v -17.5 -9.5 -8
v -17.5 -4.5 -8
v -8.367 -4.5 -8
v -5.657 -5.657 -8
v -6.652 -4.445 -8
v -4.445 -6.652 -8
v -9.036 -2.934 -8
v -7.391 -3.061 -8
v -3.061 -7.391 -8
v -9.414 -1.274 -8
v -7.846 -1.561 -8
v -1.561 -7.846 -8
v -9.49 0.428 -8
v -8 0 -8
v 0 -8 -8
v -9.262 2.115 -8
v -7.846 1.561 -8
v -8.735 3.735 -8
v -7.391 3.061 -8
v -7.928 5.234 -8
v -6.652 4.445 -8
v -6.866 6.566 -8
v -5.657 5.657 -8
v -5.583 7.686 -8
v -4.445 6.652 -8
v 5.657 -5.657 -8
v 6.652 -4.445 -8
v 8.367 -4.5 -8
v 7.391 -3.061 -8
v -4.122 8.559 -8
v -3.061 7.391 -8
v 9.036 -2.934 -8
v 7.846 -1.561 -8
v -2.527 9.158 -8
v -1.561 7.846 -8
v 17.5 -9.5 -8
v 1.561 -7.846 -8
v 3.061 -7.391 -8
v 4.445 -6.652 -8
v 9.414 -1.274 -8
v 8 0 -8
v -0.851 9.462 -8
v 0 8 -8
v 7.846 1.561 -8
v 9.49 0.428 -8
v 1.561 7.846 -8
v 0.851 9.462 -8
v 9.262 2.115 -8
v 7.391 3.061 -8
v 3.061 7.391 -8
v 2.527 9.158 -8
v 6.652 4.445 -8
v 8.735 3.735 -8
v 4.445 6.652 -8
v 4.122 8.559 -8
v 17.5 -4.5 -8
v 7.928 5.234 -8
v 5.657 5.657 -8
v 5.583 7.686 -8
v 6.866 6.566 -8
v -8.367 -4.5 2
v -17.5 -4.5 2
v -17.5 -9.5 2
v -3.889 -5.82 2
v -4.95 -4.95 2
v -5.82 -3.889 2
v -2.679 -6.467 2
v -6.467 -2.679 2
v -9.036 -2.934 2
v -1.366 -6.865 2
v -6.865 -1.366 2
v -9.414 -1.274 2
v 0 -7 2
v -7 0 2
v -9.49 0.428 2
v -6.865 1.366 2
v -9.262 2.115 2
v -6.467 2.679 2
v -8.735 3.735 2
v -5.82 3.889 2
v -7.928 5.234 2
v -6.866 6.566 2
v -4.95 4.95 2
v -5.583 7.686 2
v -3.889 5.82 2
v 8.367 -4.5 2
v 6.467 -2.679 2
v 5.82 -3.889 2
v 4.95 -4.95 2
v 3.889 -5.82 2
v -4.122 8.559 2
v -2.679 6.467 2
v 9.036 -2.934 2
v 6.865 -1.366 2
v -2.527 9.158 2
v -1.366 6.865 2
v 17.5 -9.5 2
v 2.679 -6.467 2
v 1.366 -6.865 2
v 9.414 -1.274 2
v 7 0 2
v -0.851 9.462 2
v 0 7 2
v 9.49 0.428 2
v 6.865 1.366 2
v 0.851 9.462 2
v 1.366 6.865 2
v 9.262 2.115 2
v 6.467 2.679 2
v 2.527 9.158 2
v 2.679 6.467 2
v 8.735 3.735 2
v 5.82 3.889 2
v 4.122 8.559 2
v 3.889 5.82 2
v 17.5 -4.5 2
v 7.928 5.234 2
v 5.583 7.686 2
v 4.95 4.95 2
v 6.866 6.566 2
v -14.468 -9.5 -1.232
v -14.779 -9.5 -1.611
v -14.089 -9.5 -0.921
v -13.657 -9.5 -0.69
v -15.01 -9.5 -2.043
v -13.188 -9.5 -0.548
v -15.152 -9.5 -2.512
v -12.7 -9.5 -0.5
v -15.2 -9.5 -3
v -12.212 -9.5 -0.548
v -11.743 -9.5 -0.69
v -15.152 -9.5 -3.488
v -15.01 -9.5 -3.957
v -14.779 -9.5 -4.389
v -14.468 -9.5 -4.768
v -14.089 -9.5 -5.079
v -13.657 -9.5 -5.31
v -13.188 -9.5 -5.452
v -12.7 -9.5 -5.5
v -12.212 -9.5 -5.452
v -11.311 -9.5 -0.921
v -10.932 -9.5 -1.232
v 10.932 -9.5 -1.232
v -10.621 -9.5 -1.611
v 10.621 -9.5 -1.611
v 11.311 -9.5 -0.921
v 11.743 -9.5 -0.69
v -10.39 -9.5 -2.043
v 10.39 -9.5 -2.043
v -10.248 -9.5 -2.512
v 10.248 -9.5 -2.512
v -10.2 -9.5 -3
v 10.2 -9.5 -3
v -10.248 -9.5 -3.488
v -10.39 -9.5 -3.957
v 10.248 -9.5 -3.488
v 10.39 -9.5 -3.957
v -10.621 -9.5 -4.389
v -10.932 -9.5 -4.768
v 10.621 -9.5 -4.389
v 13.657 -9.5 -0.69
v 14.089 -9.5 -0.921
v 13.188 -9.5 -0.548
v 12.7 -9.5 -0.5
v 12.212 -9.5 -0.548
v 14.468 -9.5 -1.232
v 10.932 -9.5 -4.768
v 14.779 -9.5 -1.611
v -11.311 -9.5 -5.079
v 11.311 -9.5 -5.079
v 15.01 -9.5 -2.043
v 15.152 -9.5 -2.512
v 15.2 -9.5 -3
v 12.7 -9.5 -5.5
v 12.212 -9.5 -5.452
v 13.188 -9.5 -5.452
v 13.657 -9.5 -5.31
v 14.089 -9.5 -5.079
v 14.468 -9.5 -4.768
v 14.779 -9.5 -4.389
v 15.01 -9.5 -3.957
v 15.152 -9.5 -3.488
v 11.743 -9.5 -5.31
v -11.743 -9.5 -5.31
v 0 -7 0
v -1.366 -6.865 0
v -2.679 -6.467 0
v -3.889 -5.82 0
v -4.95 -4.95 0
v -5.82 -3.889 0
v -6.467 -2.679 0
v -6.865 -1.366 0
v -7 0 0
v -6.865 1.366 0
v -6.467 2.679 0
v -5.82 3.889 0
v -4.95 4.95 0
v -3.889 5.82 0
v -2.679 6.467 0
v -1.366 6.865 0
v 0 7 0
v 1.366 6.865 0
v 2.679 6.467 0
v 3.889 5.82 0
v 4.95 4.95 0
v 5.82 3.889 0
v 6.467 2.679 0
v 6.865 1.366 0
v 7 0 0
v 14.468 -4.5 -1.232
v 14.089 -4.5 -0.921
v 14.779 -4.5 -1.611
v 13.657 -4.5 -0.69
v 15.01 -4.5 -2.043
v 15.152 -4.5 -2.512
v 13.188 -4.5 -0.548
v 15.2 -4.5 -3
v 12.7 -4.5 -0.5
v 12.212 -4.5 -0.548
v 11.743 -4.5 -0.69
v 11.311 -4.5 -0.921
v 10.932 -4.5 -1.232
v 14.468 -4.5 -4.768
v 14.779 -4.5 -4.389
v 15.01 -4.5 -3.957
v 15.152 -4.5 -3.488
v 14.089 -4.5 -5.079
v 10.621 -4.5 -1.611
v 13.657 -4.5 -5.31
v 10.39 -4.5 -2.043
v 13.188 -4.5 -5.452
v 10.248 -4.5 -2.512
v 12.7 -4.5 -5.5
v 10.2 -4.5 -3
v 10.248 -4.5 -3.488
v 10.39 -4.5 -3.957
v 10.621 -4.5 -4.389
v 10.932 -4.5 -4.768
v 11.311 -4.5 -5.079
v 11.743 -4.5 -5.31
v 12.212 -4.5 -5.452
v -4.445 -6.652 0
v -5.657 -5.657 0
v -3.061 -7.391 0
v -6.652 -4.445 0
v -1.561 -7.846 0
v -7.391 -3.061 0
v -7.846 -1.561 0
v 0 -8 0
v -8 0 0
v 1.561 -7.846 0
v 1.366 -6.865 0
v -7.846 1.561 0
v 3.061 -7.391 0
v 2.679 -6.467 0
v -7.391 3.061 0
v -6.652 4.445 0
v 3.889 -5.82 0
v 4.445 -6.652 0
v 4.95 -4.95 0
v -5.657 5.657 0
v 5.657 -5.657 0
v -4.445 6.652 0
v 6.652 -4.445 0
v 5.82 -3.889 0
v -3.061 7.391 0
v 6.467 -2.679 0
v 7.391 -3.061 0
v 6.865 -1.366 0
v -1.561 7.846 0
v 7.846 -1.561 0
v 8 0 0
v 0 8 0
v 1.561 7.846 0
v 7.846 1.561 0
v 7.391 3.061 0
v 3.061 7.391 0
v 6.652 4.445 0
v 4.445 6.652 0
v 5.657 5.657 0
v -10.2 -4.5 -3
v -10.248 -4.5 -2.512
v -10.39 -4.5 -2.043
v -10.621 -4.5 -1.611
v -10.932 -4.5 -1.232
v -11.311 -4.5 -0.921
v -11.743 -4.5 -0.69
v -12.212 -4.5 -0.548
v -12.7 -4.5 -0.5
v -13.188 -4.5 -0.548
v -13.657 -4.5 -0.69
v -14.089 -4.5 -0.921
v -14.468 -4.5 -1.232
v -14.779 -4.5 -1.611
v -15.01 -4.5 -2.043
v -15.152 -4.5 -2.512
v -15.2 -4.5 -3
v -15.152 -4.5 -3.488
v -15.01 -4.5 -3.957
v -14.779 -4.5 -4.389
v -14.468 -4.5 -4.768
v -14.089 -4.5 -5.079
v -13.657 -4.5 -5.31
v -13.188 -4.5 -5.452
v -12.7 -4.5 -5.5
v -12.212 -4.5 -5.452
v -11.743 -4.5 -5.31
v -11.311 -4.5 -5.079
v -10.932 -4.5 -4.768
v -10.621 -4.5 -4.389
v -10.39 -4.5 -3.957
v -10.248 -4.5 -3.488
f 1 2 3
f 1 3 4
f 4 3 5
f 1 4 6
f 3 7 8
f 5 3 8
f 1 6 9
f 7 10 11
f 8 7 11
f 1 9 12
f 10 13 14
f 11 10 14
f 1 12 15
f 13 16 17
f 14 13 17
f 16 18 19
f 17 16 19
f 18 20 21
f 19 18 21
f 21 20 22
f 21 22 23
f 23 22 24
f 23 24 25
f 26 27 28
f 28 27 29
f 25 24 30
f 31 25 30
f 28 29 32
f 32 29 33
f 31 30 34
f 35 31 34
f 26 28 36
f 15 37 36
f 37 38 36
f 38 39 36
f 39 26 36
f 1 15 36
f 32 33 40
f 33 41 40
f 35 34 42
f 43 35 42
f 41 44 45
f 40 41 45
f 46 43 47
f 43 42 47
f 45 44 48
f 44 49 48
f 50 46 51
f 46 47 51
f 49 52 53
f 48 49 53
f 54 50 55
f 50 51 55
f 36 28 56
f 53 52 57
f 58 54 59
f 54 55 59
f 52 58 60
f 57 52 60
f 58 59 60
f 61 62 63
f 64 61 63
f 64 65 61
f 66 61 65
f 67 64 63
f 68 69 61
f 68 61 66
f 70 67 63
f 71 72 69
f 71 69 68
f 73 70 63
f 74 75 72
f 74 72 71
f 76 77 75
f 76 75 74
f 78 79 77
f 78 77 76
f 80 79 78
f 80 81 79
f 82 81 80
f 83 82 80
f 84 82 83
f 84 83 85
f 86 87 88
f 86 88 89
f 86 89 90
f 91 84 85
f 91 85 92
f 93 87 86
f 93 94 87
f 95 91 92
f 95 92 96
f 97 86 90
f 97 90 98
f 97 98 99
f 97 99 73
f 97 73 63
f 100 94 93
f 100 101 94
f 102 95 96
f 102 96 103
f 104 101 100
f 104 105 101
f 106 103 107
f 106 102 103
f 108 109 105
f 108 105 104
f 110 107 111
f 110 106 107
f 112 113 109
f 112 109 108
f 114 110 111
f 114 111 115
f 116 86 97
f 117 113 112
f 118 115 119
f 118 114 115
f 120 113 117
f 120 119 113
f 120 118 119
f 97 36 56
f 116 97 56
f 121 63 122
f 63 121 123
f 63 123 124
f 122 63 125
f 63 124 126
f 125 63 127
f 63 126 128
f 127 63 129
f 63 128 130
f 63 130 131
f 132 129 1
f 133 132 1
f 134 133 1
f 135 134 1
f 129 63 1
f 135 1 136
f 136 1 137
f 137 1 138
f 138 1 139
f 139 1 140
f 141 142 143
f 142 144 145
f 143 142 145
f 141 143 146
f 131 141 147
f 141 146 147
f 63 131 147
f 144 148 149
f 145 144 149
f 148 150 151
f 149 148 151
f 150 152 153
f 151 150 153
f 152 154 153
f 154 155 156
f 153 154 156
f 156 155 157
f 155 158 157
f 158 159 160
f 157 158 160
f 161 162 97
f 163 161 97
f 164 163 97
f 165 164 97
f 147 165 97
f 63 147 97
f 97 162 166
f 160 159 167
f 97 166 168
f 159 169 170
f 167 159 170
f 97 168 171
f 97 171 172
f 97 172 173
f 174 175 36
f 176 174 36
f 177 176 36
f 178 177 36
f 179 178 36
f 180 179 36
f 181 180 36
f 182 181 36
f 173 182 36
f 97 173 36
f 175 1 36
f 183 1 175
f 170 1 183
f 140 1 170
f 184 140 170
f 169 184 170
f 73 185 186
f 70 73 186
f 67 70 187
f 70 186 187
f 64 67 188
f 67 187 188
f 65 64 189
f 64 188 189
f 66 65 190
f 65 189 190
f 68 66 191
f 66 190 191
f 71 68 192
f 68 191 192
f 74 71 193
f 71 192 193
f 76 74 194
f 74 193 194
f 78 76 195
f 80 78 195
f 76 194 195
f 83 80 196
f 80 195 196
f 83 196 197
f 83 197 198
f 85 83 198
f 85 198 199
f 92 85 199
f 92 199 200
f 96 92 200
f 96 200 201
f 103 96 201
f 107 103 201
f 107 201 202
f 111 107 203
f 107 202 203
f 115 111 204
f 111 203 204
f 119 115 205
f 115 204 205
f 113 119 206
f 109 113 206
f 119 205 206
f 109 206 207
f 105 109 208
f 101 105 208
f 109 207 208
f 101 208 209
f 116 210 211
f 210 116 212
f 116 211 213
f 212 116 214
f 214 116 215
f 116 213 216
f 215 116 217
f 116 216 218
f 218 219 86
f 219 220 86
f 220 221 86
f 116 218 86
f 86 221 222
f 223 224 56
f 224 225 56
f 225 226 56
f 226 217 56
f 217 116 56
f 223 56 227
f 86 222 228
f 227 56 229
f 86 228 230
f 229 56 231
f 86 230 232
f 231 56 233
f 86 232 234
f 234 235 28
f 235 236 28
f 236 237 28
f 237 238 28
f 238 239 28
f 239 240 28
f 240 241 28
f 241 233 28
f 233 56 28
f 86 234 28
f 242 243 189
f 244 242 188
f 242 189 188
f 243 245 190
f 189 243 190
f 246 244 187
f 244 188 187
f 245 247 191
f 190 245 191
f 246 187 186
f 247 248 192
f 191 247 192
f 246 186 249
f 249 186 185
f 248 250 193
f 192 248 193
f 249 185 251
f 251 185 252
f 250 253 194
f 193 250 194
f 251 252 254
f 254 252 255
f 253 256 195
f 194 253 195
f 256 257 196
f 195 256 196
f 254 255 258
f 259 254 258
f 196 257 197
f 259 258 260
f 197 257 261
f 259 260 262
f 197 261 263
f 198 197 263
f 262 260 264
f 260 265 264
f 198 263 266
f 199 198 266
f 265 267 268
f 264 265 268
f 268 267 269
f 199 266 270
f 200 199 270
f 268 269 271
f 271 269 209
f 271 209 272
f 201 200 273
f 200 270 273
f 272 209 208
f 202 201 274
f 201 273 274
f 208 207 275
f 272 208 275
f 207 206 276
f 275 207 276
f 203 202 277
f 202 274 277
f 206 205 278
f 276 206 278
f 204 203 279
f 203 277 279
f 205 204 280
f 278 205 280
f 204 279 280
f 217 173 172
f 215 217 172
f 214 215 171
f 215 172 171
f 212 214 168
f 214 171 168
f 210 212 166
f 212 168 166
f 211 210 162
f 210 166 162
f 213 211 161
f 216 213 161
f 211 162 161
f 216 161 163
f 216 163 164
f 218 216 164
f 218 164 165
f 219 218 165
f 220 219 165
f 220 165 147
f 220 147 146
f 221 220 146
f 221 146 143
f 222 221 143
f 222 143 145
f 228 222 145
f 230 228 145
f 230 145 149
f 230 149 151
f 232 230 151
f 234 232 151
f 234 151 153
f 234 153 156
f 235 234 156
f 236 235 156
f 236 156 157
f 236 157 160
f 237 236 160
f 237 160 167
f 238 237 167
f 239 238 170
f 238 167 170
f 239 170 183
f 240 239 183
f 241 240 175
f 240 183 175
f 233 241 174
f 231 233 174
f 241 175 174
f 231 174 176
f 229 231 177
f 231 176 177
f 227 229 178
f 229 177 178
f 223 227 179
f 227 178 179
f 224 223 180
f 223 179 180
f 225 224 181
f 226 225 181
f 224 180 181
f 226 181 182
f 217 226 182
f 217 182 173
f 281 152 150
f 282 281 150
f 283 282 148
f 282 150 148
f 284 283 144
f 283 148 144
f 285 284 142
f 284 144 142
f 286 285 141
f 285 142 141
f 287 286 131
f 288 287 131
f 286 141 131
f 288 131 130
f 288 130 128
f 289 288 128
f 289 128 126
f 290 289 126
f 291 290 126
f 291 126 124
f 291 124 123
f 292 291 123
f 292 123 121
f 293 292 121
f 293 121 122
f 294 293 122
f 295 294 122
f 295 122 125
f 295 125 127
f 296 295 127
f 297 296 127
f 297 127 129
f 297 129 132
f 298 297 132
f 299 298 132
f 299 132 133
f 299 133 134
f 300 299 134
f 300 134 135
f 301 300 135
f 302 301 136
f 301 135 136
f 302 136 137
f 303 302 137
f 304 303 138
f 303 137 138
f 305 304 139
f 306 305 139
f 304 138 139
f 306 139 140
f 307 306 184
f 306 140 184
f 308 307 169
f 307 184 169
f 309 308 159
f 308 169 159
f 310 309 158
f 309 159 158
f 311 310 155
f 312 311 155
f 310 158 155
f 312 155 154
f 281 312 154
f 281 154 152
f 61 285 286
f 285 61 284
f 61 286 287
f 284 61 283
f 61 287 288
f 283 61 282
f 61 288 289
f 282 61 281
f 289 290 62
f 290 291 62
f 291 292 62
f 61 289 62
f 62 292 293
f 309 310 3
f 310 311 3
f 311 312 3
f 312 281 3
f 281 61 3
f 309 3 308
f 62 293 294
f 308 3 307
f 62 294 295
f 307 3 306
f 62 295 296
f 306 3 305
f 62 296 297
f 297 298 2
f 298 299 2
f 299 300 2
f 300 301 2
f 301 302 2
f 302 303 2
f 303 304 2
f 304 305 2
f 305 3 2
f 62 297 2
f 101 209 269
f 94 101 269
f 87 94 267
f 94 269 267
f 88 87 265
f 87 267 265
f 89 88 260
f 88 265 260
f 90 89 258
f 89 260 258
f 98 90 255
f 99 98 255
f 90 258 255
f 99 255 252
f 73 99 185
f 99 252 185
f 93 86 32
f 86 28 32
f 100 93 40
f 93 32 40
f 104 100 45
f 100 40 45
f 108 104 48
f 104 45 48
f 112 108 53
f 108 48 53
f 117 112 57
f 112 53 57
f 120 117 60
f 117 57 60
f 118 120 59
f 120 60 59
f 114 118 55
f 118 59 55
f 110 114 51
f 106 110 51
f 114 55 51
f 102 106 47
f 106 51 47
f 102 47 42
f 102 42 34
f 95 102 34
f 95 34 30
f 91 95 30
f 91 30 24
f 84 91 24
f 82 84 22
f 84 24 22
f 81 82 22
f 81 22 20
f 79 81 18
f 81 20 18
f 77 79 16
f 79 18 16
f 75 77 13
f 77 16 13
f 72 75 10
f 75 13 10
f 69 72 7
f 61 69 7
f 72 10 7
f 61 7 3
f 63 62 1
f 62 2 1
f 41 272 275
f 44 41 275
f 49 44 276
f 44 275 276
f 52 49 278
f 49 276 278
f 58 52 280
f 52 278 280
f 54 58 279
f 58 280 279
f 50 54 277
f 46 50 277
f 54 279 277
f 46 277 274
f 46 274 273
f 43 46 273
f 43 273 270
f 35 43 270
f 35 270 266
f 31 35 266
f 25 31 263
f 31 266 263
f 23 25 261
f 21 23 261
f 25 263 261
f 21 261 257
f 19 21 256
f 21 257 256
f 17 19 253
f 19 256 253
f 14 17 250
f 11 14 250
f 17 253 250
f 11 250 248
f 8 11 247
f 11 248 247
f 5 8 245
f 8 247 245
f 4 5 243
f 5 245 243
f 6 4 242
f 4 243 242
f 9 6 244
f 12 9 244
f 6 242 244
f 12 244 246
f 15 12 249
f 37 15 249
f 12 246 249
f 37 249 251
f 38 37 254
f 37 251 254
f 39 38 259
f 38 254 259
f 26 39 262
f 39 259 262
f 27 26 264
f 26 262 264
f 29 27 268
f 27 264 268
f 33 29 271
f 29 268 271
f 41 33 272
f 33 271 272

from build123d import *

# Parameters (mm, degrees)
F0_R     = 8
F1_DEPTH = 8
F3_DEPTH = 2
F4_R     = 2.5
F5_DEPTH = 25.4


with BuildPart() as f1:
    # F0 (on Top) → F1 (new body)
    with BuildSketch(Plane.XY):
        with BuildLine():
            Line((17.5, -4.5), (8.3666, -4.5))
            ThreePointArc((8.3666, -4.5), (0, 9.5), (-8.3666, -4.5))
            Line((-8.3666, -4.5), (-17.5, -4.5))
            Line((-17.5, -4.5), (-17.5, -9.5))
            Line((-17.5, -9.5), (0, -9.5))
            Line((0, -9.5), (17.5, -9.5))
            Line((17.5, -9.5), (17.5, -4.5))
        make_face()
        Circle(F0_R, mode=Mode.SUBTRACT)
    extrude(amount=-F1_DEPTH)

    # F2 (on Top) + F0 (on Top) → F3 (join)
    with BuildSketch(Plane.XY):
        with BuildLine():
            ThreePointArc((0, -7), (4.949747, -4.949747), (7, 0))
            ThreePointArc((7, 0), (-4.949747, 4.949747), (0, -7))
        make_face()
        with BuildLine():
            Line((17.5, -4.5), (8.3666, -4.5))
            ThreePointArc((8.3666, -4.5), (0, 9.5), (-8.3666, -4.5))
            Line((-8.3666, -4.5), (-17.5, -4.5))
            Line((-17.5, -4.5), (-17.5, -9.5))
            Line((-17.5, -9.5), (0, -9.5))
            Line((0, -9.5), (17.5, -9.5))
            Line((17.5, -9.5), (17.5, -4.5))
        make_face()
        with BuildLine():
            ThreePointArc((0, -7), (-4.949747, 4.949747), (7, 0))
            ThreePointArc((7, 0), (4.949747, -4.949747), (0, -7))
        make_face(mode=Mode.SUBTRACT)
    with BuildSketch(Plane.XY):
        with BuildLine():
            Line((17.5, -4.5), (8.3666, -4.5))
            ThreePointArc((8.3666, -4.5), (0, 9.5), (-8.3666, -4.5))
            Line((-8.3666, -4.5), (-17.5, -4.5))
            Line((-17.5, -4.5), (-17.5, -9.5))
            Line((-17.5, -9.5), (0, -9.5))
            Line((0, -9.5), (17.5, -9.5))
            Line((17.5, -9.5), (17.5, -4.5))
        make_face()
        Circle(F0_R, mode=Mode.SUBTRACT)
    extrude(amount=F3_DEPTH)

    # F4 (on face) → F5 (cut)
    with BuildSketch(Plane.XZ.offset(9.5)):
        with Locations((-12.7, -3)):
            Circle(F4_R)
        with Locations((12.7, -3)):
            Circle(F4_R)
    extrude(amount=-F5_DEPTH, mode=Mode.SUBTRACT)


solid = f1.part
